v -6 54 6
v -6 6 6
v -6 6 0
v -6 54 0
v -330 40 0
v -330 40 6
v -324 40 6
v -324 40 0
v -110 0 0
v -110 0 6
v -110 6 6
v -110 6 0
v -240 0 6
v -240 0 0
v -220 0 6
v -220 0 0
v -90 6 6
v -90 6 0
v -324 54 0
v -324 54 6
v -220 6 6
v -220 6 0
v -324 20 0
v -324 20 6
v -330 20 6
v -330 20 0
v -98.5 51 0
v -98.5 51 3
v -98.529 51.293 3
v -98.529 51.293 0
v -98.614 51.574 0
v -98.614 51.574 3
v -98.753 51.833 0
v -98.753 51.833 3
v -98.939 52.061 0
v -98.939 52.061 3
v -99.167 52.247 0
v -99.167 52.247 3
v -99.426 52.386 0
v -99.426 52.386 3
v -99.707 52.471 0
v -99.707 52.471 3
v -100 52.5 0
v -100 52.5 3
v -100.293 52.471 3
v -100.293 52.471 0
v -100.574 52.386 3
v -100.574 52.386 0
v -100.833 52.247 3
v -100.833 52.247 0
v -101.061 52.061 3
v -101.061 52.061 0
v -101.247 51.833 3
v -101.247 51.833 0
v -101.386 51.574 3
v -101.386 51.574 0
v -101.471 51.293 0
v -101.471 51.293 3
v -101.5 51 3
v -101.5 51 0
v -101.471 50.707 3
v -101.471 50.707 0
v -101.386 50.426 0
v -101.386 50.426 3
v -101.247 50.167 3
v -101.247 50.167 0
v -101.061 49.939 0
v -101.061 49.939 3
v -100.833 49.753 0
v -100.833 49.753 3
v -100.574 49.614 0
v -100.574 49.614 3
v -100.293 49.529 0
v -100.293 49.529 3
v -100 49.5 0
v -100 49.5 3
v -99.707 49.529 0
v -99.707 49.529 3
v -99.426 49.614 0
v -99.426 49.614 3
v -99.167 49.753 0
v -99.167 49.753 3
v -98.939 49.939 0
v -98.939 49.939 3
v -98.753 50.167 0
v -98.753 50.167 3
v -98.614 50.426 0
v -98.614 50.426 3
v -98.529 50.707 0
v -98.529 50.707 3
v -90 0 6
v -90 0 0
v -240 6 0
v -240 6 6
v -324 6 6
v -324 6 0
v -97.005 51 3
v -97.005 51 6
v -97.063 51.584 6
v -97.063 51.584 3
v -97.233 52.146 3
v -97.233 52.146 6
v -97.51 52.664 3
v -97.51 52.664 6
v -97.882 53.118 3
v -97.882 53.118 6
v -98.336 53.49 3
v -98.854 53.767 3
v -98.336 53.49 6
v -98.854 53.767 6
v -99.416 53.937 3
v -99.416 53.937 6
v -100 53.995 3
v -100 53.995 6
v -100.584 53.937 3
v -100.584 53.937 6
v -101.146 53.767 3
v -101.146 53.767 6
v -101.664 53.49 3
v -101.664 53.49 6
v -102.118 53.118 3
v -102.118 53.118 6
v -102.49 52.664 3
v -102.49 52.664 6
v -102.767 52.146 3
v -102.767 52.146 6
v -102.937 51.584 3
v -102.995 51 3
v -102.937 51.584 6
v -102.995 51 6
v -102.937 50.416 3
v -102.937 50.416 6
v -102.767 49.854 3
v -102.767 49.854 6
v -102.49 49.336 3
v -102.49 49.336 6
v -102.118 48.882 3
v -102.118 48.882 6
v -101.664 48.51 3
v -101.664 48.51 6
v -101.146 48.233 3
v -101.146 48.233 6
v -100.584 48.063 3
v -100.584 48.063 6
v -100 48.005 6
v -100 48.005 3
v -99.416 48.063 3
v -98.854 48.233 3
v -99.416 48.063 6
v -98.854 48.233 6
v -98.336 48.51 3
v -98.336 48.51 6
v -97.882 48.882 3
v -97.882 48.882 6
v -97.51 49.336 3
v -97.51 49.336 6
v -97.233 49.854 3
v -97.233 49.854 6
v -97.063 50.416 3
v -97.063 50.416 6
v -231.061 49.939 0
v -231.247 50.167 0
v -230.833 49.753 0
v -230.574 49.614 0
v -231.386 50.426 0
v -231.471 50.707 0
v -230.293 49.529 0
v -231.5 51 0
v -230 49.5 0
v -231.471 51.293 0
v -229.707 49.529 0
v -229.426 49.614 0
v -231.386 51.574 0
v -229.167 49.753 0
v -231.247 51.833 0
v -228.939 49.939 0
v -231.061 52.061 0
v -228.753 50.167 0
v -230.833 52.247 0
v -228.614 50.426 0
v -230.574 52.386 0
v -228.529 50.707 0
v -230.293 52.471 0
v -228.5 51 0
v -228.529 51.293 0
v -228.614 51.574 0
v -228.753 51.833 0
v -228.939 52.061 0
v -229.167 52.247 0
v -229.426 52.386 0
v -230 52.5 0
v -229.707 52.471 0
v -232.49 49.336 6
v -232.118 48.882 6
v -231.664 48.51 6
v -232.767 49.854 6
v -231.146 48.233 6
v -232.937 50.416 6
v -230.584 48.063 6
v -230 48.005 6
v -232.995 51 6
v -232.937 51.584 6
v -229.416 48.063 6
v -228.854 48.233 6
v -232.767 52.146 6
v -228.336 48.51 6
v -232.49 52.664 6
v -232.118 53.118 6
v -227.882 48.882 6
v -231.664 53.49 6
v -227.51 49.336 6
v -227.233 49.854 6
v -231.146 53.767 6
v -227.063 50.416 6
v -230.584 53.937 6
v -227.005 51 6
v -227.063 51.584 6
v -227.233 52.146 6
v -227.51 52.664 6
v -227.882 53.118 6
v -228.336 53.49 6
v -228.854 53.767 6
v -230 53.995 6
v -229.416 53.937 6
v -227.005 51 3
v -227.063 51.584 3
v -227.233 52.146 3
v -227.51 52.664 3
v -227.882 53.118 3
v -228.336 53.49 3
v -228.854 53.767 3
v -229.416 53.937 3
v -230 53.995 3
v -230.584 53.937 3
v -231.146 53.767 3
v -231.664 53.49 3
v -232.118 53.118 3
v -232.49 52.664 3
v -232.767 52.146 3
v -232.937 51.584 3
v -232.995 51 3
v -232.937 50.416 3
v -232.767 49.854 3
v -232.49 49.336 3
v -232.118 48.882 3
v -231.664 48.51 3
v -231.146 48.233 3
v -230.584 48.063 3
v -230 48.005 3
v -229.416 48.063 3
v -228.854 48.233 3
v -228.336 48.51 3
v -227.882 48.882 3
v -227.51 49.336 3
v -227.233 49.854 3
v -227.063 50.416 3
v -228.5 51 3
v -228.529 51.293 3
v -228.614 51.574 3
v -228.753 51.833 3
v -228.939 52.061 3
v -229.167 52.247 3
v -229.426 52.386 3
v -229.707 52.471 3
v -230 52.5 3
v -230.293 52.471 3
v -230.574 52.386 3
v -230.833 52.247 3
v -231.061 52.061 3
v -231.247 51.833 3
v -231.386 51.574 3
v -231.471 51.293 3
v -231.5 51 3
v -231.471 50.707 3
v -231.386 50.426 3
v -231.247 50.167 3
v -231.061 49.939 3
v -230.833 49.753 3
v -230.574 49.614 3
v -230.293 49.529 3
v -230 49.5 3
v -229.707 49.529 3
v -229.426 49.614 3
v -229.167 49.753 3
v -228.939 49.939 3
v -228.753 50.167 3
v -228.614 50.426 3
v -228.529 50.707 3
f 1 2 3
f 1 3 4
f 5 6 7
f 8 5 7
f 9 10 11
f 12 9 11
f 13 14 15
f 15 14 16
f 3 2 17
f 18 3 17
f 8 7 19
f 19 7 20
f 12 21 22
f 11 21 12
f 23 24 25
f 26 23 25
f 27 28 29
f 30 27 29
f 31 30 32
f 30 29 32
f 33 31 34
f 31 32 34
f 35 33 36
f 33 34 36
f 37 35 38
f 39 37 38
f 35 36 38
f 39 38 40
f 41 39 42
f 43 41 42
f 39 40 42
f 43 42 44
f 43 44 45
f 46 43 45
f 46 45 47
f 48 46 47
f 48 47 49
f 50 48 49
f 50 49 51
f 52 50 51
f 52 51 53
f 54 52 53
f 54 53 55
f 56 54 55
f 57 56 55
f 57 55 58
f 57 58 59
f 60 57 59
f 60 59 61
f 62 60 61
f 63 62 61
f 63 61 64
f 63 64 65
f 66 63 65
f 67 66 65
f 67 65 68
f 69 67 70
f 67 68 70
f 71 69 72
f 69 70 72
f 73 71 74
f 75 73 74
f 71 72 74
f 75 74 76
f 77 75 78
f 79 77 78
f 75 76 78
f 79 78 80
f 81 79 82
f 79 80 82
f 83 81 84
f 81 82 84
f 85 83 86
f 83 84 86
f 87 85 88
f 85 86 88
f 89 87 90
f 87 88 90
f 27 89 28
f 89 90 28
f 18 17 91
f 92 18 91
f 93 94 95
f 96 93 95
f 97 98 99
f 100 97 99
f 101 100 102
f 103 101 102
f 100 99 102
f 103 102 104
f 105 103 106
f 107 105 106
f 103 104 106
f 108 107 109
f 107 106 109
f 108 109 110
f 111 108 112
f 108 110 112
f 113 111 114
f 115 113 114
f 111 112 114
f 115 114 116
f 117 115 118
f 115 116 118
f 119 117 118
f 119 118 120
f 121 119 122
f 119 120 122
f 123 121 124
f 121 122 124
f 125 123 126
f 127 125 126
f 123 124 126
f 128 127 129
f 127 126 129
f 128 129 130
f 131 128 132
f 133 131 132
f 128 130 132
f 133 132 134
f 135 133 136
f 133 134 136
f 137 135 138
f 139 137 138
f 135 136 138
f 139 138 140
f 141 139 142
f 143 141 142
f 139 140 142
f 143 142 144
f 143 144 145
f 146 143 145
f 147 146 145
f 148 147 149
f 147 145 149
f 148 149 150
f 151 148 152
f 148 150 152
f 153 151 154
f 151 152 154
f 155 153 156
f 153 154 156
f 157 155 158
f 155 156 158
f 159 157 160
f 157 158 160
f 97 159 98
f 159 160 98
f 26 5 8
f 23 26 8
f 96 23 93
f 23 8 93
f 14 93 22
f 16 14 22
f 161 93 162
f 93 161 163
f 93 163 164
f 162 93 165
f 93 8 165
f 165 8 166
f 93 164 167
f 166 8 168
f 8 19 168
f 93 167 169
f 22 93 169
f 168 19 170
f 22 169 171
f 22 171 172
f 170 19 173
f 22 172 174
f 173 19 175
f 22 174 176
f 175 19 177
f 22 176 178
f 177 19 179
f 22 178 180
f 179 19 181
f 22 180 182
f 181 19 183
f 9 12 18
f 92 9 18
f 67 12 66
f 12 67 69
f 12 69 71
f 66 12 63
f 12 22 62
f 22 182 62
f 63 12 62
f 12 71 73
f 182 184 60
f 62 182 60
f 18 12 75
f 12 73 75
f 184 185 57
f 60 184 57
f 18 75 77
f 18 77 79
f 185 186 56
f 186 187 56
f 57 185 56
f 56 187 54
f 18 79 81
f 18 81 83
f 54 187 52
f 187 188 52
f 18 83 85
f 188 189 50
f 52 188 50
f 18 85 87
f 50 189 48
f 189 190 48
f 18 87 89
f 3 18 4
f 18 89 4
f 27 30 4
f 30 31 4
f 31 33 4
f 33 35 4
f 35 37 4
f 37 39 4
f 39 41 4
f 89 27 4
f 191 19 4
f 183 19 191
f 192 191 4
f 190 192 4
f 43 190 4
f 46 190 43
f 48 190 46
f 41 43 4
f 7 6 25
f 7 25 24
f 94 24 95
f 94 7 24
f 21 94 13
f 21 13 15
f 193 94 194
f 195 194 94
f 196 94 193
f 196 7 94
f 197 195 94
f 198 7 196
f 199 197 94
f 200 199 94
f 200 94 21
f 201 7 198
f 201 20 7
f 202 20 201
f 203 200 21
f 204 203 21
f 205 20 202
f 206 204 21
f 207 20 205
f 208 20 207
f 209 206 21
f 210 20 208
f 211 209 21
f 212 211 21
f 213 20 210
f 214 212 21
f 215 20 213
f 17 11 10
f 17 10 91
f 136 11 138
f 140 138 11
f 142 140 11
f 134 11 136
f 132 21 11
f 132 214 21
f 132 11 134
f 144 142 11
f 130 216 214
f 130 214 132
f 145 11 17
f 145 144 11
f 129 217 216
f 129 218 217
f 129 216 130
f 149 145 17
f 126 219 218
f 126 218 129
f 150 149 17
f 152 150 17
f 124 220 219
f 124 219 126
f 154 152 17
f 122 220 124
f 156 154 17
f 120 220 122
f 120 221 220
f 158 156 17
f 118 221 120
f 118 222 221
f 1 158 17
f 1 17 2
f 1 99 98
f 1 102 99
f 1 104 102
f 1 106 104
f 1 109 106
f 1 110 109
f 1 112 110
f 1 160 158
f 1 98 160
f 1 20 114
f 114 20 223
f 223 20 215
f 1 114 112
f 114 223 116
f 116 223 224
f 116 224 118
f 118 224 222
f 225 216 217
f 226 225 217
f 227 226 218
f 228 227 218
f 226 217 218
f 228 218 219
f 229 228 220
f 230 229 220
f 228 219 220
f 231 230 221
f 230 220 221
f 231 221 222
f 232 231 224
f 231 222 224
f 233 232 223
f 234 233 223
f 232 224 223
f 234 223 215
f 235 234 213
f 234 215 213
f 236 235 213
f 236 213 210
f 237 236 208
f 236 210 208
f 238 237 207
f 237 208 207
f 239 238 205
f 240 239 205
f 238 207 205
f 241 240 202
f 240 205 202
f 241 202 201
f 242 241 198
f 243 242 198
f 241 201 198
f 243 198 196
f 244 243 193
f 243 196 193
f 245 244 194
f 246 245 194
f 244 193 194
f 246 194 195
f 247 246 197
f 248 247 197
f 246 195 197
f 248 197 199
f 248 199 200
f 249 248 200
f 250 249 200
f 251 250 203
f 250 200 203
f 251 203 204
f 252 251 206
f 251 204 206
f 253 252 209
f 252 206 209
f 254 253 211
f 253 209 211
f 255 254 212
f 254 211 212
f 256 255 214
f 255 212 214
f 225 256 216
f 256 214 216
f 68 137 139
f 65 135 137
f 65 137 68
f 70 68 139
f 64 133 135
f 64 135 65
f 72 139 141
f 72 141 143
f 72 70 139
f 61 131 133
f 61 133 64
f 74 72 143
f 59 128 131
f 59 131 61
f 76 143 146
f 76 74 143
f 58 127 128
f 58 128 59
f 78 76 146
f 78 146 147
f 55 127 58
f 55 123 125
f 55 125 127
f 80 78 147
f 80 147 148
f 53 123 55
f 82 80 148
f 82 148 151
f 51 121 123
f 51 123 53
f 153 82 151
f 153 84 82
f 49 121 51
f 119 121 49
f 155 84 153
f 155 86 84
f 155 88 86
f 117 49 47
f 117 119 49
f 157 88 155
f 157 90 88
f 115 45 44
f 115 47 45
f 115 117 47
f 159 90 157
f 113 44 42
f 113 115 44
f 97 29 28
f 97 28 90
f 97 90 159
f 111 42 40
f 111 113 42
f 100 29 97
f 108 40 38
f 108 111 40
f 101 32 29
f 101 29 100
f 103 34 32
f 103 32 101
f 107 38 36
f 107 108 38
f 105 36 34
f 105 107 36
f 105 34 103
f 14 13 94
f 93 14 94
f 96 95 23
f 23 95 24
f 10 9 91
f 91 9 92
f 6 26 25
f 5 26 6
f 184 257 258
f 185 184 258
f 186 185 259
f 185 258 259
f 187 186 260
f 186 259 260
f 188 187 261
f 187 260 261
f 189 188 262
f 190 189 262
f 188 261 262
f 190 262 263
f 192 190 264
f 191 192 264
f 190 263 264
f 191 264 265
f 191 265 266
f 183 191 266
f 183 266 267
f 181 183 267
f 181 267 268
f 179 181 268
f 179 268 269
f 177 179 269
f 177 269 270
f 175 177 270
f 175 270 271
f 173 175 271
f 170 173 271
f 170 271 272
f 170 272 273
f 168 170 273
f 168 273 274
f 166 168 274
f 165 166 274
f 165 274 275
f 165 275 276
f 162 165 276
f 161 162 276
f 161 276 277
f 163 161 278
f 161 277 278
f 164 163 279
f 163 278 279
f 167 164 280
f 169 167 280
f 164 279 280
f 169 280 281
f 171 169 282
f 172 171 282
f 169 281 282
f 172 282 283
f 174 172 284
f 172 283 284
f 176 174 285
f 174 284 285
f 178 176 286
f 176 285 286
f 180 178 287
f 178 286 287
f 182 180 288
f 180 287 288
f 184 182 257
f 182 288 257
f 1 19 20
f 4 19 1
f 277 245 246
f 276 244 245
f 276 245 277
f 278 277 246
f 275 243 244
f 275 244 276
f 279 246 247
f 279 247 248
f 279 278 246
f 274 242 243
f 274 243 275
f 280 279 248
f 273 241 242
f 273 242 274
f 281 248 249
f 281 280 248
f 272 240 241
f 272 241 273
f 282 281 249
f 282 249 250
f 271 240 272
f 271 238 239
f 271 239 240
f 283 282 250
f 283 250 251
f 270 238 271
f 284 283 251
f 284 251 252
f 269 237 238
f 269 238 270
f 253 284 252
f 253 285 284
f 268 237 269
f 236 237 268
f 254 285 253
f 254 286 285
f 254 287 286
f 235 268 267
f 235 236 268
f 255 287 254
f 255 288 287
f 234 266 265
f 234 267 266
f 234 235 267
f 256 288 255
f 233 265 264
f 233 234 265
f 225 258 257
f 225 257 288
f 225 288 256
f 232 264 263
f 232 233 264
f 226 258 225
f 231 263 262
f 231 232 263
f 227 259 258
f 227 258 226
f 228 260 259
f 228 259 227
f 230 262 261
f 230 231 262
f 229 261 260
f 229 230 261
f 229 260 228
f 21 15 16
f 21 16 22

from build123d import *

# Parameters (mm, degrees)
ESQUISSE1_W             = 330
ESQUISSE1_H             = 54
BOSS_EXTRU_1_DEPTH      = 6
ESQUISSE2_W             = 6
ESQUISSE2_H             = 14
ESQUISSE2_W_2           = 110
ESQUISSE2_H_2           = 6
ENL_V_MAT_EXTRU_1_DEPTH = 335.442820225
ESQUISSE3_R             = 1.5
ESQUISSE3_W             = 6
ESQUISSE3_H             = 20
ENL_V_MAT_EXTRU_2_DEPTH = 6
ESQUISSE4_R             = 2.995
ENL_V_MAT_EXTRU_3_DEPTH = 3


with BuildPart() as part:
    # Esquisse1 → Boss.-Extru.1 (new body)
    with BuildSketch(Plane.XY):
        with Locations((-165, 27)):
            Rectangle(ESQUISSE1_W, ESQUISSE1_H)
    extrude(amount=BOSS_EXTRU_1_DEPTH)

    # Esquisse2 → Enlèv. mat.-Extru.1 (cut, through all)
    with BuildSketch(Plane.XY.offset(6)):
        Polygon((-330, 0), (-240, 0), (-240, 6), (-324, 6), (-324, 20), (-330, 20), align=None)
        Polygon((-90, 6), (-90, 0), (0, 0), (0, 20), (-6, 20), (-6, 6), align=None)
        with Locations((-327, 47)):
            Rectangle(ESQUISSE2_W, ESQUISSE2_H)
        with Locations((-3, 47)):
            Rectangle(ESQUISSE2_W, ESQUISSE2_H)
        with Locations((-165, 3)):
            Rectangle(ESQUISSE2_W_2, ESQUISSE2_H_2)
    extrude(amount=-ENL_V_MAT_EXTRU_1_DEPTH, mode=Mode.SUBTRACT)

    # Esquisse3 → Enlèv. mat.-Extru.2 (cut)
    with BuildSketch(Plane.XY.offset(6)):
        with Locations((-230, 51)):
            Circle(ESQUISSE3_R)
        with Locations((-100, 51)):
            Circle(ESQUISSE3_R)
        with Locations((-3, 30)):
            Rectangle(ESQUISSE3_W, ESQUISSE3_H)
    extrude(amount=-ENL_V_MAT_EXTRU_2_DEPTH, mode=Mode.SUBTRACT)

    # Esquisse4 → Enlèv. mat.-Extru.3 (cut)
    with BuildSketch(Plane.XY.offset(6)):
        with Locations((-230, 51)):
            Circle(ESQUISSE4_R)
        with Locations((-100, 51)):
            Circle(ESQUISSE4_R)
    extrude(amount=-ENL_V_MAT_EXTRU_3_DEPTH, mode=Mode.SUBTRACT)


solid = part.part
